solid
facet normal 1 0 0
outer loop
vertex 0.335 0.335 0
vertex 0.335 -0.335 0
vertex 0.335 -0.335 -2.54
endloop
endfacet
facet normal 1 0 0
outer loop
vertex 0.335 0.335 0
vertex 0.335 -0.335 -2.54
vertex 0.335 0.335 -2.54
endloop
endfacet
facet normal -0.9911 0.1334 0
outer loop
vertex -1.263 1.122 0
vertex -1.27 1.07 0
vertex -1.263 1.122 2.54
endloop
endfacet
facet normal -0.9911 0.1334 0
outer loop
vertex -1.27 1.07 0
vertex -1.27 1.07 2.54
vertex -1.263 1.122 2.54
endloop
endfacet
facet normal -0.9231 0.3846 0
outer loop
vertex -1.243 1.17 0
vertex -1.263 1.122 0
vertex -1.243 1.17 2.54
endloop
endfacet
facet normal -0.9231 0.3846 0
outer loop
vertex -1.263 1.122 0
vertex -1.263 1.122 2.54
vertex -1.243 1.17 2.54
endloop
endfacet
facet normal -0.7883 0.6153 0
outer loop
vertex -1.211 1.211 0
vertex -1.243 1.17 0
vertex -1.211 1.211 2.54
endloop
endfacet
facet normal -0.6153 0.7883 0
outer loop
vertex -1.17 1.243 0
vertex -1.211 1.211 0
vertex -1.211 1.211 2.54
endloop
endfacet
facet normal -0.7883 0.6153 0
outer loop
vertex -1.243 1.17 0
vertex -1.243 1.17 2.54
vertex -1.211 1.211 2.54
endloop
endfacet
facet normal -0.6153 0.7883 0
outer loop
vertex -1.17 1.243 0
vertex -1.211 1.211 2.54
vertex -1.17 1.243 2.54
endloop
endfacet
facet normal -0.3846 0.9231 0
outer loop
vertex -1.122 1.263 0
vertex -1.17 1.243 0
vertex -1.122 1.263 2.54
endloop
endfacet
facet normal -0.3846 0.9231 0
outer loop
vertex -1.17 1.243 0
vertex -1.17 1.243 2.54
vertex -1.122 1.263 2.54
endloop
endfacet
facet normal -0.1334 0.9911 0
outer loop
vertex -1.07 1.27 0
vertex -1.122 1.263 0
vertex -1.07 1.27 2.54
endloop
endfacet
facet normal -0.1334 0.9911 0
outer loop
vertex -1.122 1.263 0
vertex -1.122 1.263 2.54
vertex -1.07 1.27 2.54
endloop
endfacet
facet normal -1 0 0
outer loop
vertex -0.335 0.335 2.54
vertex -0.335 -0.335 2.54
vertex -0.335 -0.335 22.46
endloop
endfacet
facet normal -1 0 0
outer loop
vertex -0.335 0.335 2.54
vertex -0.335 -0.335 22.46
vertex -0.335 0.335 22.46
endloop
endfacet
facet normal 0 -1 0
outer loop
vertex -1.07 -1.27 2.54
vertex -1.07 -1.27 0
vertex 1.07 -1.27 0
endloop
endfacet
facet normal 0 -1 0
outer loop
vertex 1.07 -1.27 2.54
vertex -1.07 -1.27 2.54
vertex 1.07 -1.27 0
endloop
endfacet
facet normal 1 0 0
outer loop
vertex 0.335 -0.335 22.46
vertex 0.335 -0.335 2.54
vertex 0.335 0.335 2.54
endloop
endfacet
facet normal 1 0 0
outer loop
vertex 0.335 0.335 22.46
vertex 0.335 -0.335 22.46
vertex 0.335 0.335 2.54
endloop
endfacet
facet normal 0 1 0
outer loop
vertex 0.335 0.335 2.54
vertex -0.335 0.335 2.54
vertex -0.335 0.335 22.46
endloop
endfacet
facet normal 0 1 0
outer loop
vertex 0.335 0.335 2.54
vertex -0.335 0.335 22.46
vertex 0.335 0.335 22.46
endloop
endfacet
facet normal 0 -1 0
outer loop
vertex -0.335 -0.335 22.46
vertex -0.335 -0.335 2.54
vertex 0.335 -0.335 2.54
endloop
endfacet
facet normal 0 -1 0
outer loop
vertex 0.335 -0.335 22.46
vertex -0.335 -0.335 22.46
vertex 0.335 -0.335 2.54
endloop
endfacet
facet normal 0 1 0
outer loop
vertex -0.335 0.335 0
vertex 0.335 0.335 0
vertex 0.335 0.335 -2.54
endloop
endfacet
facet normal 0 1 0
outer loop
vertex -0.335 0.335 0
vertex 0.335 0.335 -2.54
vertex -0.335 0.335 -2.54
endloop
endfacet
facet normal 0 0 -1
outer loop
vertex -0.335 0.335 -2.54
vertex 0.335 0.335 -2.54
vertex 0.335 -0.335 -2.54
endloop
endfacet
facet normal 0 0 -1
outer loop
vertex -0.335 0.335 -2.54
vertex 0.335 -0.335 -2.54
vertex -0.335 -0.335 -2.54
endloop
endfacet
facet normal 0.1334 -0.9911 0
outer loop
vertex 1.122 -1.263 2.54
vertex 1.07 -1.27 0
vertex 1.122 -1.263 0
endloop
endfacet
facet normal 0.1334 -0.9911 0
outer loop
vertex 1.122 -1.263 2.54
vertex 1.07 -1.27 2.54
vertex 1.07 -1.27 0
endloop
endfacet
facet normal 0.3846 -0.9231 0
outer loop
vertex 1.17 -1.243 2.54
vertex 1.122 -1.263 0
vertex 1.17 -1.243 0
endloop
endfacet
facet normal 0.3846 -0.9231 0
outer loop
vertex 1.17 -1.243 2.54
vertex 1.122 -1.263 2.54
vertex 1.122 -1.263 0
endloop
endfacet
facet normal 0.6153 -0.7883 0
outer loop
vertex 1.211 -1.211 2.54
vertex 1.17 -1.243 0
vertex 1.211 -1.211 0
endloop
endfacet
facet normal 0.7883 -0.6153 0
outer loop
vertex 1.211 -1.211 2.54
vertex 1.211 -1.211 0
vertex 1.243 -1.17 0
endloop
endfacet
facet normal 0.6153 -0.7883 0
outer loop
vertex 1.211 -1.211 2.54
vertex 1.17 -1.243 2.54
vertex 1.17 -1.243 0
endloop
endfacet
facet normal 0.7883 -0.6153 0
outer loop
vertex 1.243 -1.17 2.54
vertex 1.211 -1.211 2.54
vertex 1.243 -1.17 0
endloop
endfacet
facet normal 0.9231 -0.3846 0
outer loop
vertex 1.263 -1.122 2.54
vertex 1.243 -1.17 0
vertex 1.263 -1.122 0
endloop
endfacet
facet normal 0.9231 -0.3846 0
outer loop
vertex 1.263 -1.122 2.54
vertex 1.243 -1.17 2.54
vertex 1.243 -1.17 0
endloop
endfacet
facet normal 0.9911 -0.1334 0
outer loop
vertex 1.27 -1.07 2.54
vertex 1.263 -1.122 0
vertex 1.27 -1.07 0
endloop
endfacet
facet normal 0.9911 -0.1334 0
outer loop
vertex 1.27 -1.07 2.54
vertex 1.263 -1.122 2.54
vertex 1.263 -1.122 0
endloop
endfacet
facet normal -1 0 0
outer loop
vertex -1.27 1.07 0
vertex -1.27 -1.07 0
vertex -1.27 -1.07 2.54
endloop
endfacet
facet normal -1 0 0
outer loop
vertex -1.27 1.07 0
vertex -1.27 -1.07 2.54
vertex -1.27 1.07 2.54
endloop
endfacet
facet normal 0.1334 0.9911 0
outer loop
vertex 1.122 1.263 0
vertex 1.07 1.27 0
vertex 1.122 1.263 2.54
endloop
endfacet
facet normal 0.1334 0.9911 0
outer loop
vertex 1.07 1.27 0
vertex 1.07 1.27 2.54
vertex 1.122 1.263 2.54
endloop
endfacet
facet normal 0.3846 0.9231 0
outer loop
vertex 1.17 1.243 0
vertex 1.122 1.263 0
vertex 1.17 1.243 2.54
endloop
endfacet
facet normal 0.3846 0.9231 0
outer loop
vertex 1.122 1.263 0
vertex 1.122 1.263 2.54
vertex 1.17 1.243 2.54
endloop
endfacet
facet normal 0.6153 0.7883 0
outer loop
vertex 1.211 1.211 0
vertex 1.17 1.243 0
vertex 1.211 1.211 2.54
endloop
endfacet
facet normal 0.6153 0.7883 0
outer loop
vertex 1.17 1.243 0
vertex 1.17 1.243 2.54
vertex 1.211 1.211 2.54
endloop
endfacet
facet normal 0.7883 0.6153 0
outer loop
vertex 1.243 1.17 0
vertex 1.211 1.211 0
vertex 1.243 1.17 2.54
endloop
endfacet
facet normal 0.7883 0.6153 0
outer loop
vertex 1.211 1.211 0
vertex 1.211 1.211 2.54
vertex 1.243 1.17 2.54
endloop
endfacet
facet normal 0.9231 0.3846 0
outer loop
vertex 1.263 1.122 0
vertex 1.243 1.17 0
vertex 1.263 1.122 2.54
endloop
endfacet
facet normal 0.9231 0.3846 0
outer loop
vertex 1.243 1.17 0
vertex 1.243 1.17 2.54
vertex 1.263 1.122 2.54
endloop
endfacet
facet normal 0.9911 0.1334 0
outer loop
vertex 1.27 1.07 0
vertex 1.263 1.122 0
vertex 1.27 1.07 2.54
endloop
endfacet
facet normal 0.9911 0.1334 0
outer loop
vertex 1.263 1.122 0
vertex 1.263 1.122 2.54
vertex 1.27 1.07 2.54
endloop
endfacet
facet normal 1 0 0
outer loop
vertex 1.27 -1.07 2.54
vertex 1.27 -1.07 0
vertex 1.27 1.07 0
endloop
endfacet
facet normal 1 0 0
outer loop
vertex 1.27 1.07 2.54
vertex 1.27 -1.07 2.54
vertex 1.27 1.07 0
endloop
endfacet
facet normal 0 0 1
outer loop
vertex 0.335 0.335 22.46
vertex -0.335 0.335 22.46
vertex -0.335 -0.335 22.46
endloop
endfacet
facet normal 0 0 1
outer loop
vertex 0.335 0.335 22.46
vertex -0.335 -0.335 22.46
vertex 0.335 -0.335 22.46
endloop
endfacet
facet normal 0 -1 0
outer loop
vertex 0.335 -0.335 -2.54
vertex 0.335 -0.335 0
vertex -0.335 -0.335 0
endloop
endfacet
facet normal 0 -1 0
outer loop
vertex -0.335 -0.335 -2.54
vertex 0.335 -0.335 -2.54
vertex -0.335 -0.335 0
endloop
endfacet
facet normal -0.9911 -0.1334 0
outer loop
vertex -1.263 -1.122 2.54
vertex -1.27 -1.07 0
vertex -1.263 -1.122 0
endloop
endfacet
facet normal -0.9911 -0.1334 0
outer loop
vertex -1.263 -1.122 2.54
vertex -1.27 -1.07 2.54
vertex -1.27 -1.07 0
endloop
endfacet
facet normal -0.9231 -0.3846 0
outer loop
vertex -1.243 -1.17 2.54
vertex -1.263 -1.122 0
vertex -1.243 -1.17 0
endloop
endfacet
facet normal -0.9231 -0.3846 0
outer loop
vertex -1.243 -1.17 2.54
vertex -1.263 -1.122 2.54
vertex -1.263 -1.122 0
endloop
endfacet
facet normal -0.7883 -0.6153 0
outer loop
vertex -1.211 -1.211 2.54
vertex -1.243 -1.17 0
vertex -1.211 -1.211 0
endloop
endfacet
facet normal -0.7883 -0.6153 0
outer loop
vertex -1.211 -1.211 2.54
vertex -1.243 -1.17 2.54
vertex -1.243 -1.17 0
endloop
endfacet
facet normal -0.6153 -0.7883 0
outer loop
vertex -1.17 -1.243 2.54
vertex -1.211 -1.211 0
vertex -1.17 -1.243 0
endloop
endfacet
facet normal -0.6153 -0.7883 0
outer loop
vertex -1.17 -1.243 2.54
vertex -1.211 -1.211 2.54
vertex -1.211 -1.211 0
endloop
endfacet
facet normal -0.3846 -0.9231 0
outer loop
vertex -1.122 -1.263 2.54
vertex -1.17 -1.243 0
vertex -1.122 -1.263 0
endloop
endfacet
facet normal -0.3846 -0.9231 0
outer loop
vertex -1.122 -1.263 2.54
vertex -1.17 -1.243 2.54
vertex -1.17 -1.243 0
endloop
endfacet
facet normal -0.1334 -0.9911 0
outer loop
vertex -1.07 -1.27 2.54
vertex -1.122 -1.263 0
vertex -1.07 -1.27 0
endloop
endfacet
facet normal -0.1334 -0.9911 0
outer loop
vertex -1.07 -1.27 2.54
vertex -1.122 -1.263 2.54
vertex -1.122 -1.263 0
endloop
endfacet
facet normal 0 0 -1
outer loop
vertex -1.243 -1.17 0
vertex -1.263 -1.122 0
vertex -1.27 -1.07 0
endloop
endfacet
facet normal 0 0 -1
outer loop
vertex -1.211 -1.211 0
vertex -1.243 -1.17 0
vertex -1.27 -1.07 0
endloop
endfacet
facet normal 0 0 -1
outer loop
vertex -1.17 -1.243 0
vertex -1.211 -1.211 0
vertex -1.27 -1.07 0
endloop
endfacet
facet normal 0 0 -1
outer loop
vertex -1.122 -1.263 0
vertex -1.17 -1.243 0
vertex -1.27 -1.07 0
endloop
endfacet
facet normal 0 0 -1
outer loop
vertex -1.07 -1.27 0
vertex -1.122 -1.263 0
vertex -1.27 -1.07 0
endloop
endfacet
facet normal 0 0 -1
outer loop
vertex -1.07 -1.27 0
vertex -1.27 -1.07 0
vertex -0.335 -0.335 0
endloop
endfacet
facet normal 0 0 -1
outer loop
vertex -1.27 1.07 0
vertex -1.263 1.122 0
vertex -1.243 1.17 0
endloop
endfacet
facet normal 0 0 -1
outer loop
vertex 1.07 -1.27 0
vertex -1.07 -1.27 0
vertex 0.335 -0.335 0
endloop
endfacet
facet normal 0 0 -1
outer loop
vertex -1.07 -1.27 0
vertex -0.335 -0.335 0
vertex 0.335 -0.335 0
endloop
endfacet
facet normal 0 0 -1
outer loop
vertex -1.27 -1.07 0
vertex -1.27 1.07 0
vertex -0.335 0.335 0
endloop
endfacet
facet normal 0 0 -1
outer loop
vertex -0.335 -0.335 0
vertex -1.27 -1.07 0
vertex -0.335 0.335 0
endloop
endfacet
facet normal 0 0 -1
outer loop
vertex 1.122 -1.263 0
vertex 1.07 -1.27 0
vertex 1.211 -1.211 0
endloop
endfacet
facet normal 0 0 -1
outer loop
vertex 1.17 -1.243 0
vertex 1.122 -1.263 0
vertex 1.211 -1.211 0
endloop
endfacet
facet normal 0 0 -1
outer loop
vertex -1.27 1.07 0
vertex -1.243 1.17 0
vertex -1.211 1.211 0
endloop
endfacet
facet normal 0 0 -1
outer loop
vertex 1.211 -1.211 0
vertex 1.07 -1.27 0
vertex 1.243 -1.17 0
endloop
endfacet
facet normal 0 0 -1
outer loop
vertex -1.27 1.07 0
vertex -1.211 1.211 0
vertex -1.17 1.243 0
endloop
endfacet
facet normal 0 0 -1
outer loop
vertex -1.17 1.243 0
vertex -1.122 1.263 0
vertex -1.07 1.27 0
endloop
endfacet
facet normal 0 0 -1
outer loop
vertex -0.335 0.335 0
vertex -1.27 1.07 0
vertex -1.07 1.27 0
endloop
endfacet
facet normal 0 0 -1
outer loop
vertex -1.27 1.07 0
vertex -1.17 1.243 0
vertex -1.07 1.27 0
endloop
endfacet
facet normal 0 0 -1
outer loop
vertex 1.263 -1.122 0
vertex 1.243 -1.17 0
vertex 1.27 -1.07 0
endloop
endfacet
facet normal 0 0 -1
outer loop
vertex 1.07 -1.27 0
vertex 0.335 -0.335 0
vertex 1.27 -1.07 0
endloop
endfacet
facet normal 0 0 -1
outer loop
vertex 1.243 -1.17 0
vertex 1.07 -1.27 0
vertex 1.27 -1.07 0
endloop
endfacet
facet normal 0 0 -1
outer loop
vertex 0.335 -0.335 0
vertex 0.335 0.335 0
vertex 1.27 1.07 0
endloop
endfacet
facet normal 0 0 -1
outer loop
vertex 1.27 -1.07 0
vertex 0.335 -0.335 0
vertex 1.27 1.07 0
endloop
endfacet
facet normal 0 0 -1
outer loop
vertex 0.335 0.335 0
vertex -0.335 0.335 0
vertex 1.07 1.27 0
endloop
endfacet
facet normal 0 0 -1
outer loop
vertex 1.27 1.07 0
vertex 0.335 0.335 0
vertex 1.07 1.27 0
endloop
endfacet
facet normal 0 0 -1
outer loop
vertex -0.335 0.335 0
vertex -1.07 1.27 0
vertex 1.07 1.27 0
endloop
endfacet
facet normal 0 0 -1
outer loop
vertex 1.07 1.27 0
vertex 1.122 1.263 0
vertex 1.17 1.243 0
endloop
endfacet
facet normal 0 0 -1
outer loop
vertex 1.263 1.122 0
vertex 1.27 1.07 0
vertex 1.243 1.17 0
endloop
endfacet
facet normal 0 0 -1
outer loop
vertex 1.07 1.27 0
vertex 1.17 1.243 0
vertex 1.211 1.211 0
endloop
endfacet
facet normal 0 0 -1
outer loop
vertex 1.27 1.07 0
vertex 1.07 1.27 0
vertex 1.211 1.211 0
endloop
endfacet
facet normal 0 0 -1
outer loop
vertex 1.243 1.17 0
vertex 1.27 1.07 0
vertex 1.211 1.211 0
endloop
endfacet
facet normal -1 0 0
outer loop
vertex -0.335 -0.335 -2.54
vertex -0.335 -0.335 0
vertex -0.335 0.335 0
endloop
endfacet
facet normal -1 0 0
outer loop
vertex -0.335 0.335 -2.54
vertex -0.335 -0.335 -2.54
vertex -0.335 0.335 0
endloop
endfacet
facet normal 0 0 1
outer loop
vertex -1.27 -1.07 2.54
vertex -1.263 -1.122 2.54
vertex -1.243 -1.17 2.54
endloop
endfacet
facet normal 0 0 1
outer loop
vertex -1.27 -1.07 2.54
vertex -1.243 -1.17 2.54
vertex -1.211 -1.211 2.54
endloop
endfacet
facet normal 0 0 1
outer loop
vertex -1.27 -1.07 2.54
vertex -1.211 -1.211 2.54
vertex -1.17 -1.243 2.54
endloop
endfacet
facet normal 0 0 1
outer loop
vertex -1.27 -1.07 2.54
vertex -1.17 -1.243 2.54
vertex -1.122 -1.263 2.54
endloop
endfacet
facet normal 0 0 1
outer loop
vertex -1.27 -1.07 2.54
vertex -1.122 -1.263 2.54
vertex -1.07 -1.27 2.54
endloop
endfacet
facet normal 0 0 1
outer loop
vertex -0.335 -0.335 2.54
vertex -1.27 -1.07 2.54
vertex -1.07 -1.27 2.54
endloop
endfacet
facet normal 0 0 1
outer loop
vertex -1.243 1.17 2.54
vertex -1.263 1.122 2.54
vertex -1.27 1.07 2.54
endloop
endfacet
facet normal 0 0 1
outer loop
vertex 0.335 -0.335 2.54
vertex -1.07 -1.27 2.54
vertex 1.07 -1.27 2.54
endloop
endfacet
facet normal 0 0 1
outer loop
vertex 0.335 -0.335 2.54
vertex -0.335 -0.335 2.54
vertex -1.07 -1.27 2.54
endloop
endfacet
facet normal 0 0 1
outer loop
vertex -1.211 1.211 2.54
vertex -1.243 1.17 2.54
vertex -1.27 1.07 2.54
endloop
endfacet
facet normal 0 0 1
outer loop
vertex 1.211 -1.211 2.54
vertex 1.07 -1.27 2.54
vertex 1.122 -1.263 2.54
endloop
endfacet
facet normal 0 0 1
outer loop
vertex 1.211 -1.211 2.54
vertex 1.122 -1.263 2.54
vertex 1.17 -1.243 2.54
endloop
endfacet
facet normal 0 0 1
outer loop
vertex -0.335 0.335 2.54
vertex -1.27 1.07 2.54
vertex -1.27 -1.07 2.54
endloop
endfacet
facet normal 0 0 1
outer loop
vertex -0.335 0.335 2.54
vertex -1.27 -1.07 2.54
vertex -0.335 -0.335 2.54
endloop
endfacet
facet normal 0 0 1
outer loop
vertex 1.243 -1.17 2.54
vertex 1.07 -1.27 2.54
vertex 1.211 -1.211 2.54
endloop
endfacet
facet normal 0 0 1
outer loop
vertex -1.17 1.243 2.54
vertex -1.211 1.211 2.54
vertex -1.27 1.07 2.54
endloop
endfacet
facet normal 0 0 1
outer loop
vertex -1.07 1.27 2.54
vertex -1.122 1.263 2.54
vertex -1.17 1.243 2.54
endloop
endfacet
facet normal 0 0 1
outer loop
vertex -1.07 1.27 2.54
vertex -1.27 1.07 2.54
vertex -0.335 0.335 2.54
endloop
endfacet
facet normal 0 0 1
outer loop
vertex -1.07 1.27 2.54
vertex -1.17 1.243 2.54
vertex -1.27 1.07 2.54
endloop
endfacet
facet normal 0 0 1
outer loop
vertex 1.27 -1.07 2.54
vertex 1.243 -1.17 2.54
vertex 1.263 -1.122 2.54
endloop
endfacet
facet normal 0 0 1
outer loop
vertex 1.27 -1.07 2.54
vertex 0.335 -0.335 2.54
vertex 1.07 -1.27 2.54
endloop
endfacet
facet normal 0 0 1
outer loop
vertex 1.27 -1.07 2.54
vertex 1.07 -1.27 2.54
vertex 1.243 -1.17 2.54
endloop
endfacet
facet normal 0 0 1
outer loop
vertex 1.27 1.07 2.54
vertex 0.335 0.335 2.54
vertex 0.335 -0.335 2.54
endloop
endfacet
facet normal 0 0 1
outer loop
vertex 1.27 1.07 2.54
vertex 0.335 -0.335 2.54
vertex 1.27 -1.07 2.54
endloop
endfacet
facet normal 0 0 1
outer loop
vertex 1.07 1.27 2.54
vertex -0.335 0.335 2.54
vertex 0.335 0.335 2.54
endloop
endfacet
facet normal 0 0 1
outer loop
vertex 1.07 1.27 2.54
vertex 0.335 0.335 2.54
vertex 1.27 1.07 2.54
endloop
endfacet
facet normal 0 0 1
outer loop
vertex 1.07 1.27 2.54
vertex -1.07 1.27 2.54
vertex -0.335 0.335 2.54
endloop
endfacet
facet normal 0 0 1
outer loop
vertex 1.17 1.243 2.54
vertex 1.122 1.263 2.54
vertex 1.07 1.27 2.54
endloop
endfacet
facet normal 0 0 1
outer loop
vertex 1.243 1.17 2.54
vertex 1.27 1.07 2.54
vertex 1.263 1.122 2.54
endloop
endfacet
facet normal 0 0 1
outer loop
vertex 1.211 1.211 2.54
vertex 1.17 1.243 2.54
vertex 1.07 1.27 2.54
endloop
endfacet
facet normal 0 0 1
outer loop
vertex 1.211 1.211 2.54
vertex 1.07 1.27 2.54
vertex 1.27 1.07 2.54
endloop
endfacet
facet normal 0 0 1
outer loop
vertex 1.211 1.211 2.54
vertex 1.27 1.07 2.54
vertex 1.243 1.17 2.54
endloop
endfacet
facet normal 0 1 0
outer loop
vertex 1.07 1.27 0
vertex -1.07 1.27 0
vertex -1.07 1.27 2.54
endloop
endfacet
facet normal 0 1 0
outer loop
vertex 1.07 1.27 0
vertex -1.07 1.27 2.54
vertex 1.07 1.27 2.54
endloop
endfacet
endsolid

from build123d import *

# Parameters (mm, degrees)
SKETCH_1_W        = 2.54
SKETCH_1_H        = 2.54
EXTRUDE_1_DEPTH   = 2.54
SKETCH_2_W        = 0.67
SKETCH_2_H        = 0.67
EXTRUDE_1_2_DEPTH = 2.54
SKETCH_3_W        = 0.67
SKETCH_3_H        = 0.67
EXTRUDE_2_DEPTH   = 19.92
FILLET_1_R        = 0.2


with BuildPart() as part:
    # 草图1 → Extrude 1 (new body)
    with BuildSketch(Plane.XY):
        Rectangle(SKETCH_1_W, SKETCH_1_H)
    extrude(amount=EXTRUDE_1_DEPTH)

    # 草图2 → Extrude 1 2 (add)
    with BuildSketch(Plane(origin=(0, 0, 0), x_dir=(-1, 0, 0), z_dir=(0, 0, -1))):
        Rectangle(SKETCH_2_W, SKETCH_2_H)
    extrude(amount=EXTRUDE_1_2_DEPTH)

    # 草图3 → 凸台-拉伸2 (add)
    with BuildSketch(Plane.XY.offset(2.54)):
        Rectangle(SKETCH_3_W, SKETCH_3_H)
    extrude(amount=EXTRUDE_2_DEPTH)

    # 圆角1
    fillet_1_edges = [part.edges().sort_by_distance(p)[0] for p in [
        (-1.27, 1.27, 1.27),
        (1.27, 1.27, 1.27),
        (1.27, -1.27, 1.27),
        (-1.27, -1.27, 1.27),
    ]]
    fillet(fillet_1_edges, radius=FILLET_1_R)


solid = part.part
